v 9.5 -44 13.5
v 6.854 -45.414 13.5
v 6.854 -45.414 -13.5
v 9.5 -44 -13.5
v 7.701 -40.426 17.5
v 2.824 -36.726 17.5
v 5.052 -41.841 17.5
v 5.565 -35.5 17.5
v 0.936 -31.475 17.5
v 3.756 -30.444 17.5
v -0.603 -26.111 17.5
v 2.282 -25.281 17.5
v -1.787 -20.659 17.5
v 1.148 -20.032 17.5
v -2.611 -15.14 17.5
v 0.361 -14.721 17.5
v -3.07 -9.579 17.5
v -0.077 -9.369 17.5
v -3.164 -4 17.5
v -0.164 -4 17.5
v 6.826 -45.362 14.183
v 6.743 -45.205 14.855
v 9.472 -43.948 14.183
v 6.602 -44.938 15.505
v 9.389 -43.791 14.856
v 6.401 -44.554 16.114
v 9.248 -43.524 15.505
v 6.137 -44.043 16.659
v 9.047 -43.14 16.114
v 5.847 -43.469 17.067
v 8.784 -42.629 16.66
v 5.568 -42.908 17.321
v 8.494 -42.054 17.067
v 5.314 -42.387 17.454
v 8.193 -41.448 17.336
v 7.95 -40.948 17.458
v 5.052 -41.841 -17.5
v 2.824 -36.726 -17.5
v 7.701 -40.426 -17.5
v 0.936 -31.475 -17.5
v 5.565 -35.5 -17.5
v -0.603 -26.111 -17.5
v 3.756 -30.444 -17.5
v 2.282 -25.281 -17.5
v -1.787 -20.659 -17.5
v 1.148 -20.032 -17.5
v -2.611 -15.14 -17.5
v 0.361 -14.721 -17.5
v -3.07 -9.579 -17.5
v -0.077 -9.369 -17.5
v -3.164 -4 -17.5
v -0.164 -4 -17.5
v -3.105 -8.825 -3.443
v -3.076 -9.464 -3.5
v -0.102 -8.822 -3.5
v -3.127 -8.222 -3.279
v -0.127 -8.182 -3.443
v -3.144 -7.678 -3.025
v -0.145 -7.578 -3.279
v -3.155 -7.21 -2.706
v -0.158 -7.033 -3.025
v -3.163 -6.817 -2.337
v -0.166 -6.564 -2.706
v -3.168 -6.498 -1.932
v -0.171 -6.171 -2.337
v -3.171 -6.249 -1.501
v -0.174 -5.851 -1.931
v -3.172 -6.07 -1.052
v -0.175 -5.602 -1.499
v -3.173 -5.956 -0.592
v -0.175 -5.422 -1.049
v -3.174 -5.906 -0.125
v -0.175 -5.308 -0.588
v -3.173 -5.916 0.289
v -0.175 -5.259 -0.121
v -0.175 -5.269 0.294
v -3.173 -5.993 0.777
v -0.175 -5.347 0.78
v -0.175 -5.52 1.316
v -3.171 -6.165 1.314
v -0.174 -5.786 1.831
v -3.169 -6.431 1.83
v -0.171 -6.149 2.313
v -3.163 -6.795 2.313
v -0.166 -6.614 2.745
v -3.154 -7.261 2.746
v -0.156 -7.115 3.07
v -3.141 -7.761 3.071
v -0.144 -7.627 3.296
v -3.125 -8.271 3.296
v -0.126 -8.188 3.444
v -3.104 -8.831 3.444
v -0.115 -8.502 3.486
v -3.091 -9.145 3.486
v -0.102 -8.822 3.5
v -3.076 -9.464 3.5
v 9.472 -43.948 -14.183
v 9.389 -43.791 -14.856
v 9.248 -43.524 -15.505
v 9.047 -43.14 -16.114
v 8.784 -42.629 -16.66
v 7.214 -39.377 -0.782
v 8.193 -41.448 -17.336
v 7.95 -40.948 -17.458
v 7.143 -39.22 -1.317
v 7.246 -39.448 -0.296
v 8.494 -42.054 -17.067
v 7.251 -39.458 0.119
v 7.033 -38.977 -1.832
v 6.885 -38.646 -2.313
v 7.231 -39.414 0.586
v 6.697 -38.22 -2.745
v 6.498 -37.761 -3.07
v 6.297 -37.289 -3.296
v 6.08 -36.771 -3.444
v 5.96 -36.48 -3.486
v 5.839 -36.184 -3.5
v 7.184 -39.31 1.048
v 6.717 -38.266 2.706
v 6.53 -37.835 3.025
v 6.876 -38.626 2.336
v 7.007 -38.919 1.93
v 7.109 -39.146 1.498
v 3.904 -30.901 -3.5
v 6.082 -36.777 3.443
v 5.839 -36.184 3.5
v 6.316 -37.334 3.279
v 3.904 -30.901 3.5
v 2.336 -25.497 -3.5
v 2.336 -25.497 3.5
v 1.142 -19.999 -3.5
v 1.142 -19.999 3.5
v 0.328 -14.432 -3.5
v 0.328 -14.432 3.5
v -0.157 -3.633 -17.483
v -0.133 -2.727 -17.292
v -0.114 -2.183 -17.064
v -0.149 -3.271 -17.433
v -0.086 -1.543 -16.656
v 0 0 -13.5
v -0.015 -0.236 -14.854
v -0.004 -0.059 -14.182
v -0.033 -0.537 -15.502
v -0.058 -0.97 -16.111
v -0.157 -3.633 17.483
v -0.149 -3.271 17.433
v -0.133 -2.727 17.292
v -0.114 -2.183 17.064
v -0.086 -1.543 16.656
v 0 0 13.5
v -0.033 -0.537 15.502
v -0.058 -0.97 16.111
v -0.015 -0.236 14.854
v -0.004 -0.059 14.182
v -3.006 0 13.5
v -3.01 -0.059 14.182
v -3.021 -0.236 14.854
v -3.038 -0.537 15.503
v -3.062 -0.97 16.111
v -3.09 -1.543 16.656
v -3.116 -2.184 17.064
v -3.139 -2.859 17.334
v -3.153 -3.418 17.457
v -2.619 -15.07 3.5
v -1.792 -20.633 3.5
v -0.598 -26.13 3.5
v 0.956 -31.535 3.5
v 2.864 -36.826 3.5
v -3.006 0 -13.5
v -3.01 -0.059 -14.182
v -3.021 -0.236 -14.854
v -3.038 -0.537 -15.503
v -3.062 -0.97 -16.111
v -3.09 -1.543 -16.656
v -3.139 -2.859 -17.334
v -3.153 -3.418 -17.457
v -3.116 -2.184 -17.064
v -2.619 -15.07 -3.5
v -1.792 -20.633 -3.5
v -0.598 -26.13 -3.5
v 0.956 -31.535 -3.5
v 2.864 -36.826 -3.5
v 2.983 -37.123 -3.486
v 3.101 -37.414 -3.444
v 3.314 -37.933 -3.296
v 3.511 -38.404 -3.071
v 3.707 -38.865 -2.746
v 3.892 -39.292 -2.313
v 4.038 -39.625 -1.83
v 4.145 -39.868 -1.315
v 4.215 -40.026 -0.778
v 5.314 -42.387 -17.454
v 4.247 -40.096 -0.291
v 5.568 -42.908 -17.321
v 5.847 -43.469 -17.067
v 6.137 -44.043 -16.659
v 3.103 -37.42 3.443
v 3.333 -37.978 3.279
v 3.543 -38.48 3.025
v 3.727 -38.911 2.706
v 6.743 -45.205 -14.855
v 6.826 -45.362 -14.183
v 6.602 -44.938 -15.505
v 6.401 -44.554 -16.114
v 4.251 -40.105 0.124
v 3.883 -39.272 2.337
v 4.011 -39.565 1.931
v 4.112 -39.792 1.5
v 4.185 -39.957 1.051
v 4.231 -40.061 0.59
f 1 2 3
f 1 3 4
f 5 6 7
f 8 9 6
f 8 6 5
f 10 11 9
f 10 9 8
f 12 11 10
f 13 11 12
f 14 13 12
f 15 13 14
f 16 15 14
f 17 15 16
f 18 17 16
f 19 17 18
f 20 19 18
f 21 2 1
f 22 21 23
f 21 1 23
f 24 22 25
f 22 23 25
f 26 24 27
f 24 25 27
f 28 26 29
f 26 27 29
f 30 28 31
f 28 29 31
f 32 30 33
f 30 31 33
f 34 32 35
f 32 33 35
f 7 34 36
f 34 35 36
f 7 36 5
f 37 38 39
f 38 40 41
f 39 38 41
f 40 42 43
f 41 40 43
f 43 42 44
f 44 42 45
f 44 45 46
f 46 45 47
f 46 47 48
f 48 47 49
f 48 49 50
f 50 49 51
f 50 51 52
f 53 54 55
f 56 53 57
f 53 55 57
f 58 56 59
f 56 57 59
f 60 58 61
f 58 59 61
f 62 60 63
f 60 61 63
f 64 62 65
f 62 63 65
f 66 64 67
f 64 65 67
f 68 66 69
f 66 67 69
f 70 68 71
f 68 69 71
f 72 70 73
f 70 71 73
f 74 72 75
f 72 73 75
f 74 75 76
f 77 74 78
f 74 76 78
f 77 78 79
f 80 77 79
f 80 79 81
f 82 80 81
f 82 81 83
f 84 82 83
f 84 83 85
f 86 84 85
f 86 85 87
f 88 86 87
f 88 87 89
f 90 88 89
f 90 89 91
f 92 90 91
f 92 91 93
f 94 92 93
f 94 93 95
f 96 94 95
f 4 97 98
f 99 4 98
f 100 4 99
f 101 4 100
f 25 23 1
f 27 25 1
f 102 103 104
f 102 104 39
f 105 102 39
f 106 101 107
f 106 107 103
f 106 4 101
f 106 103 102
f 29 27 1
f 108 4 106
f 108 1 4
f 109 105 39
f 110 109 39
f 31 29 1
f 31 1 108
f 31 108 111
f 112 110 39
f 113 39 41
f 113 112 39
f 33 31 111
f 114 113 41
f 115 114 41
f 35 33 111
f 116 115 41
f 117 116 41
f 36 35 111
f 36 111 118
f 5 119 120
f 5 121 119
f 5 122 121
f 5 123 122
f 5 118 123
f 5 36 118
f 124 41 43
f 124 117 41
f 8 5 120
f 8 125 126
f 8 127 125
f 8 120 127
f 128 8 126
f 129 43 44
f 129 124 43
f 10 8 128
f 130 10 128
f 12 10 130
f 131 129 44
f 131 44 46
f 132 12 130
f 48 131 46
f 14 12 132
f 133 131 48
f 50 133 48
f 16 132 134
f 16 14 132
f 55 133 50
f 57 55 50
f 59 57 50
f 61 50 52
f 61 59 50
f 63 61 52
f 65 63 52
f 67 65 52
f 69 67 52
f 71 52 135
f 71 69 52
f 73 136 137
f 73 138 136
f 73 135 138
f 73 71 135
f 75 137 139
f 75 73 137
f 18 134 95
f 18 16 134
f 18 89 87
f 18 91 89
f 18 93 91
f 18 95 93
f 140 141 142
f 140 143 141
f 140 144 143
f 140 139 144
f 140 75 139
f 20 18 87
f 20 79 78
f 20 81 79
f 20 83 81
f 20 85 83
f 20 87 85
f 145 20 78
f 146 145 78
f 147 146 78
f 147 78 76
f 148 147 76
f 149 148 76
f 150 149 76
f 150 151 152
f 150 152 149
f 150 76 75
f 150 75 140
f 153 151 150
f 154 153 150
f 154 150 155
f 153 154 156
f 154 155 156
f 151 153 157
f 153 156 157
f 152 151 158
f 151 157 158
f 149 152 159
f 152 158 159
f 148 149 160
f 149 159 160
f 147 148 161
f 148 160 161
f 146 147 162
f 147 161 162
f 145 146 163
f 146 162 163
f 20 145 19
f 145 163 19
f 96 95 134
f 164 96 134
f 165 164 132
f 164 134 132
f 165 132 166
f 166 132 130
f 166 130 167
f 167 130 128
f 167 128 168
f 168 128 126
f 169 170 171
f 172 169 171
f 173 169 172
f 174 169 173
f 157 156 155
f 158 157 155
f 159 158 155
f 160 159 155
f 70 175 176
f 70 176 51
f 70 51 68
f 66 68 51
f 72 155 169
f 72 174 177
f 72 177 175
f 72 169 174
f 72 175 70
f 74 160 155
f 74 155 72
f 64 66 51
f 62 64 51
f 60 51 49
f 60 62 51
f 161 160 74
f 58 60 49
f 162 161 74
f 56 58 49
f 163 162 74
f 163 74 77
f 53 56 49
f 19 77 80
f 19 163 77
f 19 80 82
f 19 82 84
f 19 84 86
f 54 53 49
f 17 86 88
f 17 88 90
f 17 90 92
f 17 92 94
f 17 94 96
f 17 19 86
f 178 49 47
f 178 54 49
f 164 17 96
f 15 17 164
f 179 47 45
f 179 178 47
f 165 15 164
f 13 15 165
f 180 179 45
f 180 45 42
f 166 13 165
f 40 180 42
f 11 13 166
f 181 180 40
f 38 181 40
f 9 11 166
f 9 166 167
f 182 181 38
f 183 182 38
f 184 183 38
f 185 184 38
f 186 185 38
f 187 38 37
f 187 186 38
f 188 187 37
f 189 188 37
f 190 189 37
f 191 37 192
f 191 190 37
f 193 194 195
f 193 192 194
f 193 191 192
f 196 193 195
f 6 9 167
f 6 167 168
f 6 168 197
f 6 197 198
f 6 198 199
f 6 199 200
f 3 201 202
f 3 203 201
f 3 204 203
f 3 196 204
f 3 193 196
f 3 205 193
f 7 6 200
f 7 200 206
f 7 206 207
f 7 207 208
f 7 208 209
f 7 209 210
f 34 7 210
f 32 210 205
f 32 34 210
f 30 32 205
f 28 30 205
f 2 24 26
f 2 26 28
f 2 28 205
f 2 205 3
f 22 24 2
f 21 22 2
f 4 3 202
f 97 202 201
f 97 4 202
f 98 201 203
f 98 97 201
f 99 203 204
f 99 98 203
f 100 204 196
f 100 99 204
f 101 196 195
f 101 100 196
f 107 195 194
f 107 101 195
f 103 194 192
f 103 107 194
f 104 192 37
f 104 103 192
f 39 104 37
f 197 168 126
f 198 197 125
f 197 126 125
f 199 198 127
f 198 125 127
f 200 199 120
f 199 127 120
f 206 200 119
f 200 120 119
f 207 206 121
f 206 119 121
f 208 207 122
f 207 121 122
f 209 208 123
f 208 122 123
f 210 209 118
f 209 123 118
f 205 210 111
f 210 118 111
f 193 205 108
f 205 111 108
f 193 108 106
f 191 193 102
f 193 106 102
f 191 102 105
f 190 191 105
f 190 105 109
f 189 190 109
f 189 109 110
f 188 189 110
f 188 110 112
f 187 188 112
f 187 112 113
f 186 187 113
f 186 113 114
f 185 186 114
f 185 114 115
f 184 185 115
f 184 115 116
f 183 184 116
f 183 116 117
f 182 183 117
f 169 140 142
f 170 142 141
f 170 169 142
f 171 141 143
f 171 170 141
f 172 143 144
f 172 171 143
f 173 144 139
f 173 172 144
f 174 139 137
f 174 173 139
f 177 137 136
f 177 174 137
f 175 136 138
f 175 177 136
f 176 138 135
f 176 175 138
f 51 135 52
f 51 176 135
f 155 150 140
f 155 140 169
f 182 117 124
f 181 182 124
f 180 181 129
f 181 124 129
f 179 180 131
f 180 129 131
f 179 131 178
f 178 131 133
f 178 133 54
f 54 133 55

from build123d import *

# Parameters (mm, degrees)
EXTRUSION1_DEPTH        = 17.5
CONG_1_R                = 4
ENL_V_MAT_EXTRU_1_DEPTH = 35


with BuildPart() as part:
    # Esquisse1 → Extrusion1 (new body, symmetric)
    with BuildSketch(Plane.XY):
        with BuildLine():
            Line((0, 0), (-3.006199407, 0))
            ThreePointArc((-3.006199407, 0), (-1.239978733, -23.393785135), (6.853974171, -45.413699867))
            Line((6.853974171, -45.413699867), (9.5, -44))
            ThreePointArc((9.5, -44), (1.671662982, -22.664640947), (0, 0))
        make_face()
    extrude(amount=EXTRUSION1_DEPTH, both=True)

    # Congé1
    cong_1_edges = [part.edges().sort_by_distance(p)[0] for p in [
        (-1.503099703, 0, 17.5),
        (-1.503099703, 0, -17.5),
        (8.176987086, -44.706849934, -17.5),
        (8.176987086, -44.706849934, 17.5),
    ]]
    fillet(cong_1_edges, radius=CONG_1_R)

    # Esquisse2 → Enlèv. mat.-Extru.1 (cut)
    with BuildSketch(Plane(origin=(0, 0, 0), x_dir=(0, 0, 1), z_dir=(-0.977476134, -0.211045984, 0))):
        with BuildLine():
            Line((-3.5, -36.601432597), (-3.5, -8.601432597))
            ThreePointArc((-3.5, -8.601432597), (0, -5.101432597), (3.5, -8.601432597))
            Line((3.5, -8.601432597), (3.5, -36.601432597))
            ThreePointArc((3.5, -36.601432597), (0, -40.101432597), (-3.5, -36.601432597))
        make_face()
    extrude(amount=ENL_V_MAT_EXTRU_1_DEPTH, mode=Mode.SUBTRACT)


solid = part.part
